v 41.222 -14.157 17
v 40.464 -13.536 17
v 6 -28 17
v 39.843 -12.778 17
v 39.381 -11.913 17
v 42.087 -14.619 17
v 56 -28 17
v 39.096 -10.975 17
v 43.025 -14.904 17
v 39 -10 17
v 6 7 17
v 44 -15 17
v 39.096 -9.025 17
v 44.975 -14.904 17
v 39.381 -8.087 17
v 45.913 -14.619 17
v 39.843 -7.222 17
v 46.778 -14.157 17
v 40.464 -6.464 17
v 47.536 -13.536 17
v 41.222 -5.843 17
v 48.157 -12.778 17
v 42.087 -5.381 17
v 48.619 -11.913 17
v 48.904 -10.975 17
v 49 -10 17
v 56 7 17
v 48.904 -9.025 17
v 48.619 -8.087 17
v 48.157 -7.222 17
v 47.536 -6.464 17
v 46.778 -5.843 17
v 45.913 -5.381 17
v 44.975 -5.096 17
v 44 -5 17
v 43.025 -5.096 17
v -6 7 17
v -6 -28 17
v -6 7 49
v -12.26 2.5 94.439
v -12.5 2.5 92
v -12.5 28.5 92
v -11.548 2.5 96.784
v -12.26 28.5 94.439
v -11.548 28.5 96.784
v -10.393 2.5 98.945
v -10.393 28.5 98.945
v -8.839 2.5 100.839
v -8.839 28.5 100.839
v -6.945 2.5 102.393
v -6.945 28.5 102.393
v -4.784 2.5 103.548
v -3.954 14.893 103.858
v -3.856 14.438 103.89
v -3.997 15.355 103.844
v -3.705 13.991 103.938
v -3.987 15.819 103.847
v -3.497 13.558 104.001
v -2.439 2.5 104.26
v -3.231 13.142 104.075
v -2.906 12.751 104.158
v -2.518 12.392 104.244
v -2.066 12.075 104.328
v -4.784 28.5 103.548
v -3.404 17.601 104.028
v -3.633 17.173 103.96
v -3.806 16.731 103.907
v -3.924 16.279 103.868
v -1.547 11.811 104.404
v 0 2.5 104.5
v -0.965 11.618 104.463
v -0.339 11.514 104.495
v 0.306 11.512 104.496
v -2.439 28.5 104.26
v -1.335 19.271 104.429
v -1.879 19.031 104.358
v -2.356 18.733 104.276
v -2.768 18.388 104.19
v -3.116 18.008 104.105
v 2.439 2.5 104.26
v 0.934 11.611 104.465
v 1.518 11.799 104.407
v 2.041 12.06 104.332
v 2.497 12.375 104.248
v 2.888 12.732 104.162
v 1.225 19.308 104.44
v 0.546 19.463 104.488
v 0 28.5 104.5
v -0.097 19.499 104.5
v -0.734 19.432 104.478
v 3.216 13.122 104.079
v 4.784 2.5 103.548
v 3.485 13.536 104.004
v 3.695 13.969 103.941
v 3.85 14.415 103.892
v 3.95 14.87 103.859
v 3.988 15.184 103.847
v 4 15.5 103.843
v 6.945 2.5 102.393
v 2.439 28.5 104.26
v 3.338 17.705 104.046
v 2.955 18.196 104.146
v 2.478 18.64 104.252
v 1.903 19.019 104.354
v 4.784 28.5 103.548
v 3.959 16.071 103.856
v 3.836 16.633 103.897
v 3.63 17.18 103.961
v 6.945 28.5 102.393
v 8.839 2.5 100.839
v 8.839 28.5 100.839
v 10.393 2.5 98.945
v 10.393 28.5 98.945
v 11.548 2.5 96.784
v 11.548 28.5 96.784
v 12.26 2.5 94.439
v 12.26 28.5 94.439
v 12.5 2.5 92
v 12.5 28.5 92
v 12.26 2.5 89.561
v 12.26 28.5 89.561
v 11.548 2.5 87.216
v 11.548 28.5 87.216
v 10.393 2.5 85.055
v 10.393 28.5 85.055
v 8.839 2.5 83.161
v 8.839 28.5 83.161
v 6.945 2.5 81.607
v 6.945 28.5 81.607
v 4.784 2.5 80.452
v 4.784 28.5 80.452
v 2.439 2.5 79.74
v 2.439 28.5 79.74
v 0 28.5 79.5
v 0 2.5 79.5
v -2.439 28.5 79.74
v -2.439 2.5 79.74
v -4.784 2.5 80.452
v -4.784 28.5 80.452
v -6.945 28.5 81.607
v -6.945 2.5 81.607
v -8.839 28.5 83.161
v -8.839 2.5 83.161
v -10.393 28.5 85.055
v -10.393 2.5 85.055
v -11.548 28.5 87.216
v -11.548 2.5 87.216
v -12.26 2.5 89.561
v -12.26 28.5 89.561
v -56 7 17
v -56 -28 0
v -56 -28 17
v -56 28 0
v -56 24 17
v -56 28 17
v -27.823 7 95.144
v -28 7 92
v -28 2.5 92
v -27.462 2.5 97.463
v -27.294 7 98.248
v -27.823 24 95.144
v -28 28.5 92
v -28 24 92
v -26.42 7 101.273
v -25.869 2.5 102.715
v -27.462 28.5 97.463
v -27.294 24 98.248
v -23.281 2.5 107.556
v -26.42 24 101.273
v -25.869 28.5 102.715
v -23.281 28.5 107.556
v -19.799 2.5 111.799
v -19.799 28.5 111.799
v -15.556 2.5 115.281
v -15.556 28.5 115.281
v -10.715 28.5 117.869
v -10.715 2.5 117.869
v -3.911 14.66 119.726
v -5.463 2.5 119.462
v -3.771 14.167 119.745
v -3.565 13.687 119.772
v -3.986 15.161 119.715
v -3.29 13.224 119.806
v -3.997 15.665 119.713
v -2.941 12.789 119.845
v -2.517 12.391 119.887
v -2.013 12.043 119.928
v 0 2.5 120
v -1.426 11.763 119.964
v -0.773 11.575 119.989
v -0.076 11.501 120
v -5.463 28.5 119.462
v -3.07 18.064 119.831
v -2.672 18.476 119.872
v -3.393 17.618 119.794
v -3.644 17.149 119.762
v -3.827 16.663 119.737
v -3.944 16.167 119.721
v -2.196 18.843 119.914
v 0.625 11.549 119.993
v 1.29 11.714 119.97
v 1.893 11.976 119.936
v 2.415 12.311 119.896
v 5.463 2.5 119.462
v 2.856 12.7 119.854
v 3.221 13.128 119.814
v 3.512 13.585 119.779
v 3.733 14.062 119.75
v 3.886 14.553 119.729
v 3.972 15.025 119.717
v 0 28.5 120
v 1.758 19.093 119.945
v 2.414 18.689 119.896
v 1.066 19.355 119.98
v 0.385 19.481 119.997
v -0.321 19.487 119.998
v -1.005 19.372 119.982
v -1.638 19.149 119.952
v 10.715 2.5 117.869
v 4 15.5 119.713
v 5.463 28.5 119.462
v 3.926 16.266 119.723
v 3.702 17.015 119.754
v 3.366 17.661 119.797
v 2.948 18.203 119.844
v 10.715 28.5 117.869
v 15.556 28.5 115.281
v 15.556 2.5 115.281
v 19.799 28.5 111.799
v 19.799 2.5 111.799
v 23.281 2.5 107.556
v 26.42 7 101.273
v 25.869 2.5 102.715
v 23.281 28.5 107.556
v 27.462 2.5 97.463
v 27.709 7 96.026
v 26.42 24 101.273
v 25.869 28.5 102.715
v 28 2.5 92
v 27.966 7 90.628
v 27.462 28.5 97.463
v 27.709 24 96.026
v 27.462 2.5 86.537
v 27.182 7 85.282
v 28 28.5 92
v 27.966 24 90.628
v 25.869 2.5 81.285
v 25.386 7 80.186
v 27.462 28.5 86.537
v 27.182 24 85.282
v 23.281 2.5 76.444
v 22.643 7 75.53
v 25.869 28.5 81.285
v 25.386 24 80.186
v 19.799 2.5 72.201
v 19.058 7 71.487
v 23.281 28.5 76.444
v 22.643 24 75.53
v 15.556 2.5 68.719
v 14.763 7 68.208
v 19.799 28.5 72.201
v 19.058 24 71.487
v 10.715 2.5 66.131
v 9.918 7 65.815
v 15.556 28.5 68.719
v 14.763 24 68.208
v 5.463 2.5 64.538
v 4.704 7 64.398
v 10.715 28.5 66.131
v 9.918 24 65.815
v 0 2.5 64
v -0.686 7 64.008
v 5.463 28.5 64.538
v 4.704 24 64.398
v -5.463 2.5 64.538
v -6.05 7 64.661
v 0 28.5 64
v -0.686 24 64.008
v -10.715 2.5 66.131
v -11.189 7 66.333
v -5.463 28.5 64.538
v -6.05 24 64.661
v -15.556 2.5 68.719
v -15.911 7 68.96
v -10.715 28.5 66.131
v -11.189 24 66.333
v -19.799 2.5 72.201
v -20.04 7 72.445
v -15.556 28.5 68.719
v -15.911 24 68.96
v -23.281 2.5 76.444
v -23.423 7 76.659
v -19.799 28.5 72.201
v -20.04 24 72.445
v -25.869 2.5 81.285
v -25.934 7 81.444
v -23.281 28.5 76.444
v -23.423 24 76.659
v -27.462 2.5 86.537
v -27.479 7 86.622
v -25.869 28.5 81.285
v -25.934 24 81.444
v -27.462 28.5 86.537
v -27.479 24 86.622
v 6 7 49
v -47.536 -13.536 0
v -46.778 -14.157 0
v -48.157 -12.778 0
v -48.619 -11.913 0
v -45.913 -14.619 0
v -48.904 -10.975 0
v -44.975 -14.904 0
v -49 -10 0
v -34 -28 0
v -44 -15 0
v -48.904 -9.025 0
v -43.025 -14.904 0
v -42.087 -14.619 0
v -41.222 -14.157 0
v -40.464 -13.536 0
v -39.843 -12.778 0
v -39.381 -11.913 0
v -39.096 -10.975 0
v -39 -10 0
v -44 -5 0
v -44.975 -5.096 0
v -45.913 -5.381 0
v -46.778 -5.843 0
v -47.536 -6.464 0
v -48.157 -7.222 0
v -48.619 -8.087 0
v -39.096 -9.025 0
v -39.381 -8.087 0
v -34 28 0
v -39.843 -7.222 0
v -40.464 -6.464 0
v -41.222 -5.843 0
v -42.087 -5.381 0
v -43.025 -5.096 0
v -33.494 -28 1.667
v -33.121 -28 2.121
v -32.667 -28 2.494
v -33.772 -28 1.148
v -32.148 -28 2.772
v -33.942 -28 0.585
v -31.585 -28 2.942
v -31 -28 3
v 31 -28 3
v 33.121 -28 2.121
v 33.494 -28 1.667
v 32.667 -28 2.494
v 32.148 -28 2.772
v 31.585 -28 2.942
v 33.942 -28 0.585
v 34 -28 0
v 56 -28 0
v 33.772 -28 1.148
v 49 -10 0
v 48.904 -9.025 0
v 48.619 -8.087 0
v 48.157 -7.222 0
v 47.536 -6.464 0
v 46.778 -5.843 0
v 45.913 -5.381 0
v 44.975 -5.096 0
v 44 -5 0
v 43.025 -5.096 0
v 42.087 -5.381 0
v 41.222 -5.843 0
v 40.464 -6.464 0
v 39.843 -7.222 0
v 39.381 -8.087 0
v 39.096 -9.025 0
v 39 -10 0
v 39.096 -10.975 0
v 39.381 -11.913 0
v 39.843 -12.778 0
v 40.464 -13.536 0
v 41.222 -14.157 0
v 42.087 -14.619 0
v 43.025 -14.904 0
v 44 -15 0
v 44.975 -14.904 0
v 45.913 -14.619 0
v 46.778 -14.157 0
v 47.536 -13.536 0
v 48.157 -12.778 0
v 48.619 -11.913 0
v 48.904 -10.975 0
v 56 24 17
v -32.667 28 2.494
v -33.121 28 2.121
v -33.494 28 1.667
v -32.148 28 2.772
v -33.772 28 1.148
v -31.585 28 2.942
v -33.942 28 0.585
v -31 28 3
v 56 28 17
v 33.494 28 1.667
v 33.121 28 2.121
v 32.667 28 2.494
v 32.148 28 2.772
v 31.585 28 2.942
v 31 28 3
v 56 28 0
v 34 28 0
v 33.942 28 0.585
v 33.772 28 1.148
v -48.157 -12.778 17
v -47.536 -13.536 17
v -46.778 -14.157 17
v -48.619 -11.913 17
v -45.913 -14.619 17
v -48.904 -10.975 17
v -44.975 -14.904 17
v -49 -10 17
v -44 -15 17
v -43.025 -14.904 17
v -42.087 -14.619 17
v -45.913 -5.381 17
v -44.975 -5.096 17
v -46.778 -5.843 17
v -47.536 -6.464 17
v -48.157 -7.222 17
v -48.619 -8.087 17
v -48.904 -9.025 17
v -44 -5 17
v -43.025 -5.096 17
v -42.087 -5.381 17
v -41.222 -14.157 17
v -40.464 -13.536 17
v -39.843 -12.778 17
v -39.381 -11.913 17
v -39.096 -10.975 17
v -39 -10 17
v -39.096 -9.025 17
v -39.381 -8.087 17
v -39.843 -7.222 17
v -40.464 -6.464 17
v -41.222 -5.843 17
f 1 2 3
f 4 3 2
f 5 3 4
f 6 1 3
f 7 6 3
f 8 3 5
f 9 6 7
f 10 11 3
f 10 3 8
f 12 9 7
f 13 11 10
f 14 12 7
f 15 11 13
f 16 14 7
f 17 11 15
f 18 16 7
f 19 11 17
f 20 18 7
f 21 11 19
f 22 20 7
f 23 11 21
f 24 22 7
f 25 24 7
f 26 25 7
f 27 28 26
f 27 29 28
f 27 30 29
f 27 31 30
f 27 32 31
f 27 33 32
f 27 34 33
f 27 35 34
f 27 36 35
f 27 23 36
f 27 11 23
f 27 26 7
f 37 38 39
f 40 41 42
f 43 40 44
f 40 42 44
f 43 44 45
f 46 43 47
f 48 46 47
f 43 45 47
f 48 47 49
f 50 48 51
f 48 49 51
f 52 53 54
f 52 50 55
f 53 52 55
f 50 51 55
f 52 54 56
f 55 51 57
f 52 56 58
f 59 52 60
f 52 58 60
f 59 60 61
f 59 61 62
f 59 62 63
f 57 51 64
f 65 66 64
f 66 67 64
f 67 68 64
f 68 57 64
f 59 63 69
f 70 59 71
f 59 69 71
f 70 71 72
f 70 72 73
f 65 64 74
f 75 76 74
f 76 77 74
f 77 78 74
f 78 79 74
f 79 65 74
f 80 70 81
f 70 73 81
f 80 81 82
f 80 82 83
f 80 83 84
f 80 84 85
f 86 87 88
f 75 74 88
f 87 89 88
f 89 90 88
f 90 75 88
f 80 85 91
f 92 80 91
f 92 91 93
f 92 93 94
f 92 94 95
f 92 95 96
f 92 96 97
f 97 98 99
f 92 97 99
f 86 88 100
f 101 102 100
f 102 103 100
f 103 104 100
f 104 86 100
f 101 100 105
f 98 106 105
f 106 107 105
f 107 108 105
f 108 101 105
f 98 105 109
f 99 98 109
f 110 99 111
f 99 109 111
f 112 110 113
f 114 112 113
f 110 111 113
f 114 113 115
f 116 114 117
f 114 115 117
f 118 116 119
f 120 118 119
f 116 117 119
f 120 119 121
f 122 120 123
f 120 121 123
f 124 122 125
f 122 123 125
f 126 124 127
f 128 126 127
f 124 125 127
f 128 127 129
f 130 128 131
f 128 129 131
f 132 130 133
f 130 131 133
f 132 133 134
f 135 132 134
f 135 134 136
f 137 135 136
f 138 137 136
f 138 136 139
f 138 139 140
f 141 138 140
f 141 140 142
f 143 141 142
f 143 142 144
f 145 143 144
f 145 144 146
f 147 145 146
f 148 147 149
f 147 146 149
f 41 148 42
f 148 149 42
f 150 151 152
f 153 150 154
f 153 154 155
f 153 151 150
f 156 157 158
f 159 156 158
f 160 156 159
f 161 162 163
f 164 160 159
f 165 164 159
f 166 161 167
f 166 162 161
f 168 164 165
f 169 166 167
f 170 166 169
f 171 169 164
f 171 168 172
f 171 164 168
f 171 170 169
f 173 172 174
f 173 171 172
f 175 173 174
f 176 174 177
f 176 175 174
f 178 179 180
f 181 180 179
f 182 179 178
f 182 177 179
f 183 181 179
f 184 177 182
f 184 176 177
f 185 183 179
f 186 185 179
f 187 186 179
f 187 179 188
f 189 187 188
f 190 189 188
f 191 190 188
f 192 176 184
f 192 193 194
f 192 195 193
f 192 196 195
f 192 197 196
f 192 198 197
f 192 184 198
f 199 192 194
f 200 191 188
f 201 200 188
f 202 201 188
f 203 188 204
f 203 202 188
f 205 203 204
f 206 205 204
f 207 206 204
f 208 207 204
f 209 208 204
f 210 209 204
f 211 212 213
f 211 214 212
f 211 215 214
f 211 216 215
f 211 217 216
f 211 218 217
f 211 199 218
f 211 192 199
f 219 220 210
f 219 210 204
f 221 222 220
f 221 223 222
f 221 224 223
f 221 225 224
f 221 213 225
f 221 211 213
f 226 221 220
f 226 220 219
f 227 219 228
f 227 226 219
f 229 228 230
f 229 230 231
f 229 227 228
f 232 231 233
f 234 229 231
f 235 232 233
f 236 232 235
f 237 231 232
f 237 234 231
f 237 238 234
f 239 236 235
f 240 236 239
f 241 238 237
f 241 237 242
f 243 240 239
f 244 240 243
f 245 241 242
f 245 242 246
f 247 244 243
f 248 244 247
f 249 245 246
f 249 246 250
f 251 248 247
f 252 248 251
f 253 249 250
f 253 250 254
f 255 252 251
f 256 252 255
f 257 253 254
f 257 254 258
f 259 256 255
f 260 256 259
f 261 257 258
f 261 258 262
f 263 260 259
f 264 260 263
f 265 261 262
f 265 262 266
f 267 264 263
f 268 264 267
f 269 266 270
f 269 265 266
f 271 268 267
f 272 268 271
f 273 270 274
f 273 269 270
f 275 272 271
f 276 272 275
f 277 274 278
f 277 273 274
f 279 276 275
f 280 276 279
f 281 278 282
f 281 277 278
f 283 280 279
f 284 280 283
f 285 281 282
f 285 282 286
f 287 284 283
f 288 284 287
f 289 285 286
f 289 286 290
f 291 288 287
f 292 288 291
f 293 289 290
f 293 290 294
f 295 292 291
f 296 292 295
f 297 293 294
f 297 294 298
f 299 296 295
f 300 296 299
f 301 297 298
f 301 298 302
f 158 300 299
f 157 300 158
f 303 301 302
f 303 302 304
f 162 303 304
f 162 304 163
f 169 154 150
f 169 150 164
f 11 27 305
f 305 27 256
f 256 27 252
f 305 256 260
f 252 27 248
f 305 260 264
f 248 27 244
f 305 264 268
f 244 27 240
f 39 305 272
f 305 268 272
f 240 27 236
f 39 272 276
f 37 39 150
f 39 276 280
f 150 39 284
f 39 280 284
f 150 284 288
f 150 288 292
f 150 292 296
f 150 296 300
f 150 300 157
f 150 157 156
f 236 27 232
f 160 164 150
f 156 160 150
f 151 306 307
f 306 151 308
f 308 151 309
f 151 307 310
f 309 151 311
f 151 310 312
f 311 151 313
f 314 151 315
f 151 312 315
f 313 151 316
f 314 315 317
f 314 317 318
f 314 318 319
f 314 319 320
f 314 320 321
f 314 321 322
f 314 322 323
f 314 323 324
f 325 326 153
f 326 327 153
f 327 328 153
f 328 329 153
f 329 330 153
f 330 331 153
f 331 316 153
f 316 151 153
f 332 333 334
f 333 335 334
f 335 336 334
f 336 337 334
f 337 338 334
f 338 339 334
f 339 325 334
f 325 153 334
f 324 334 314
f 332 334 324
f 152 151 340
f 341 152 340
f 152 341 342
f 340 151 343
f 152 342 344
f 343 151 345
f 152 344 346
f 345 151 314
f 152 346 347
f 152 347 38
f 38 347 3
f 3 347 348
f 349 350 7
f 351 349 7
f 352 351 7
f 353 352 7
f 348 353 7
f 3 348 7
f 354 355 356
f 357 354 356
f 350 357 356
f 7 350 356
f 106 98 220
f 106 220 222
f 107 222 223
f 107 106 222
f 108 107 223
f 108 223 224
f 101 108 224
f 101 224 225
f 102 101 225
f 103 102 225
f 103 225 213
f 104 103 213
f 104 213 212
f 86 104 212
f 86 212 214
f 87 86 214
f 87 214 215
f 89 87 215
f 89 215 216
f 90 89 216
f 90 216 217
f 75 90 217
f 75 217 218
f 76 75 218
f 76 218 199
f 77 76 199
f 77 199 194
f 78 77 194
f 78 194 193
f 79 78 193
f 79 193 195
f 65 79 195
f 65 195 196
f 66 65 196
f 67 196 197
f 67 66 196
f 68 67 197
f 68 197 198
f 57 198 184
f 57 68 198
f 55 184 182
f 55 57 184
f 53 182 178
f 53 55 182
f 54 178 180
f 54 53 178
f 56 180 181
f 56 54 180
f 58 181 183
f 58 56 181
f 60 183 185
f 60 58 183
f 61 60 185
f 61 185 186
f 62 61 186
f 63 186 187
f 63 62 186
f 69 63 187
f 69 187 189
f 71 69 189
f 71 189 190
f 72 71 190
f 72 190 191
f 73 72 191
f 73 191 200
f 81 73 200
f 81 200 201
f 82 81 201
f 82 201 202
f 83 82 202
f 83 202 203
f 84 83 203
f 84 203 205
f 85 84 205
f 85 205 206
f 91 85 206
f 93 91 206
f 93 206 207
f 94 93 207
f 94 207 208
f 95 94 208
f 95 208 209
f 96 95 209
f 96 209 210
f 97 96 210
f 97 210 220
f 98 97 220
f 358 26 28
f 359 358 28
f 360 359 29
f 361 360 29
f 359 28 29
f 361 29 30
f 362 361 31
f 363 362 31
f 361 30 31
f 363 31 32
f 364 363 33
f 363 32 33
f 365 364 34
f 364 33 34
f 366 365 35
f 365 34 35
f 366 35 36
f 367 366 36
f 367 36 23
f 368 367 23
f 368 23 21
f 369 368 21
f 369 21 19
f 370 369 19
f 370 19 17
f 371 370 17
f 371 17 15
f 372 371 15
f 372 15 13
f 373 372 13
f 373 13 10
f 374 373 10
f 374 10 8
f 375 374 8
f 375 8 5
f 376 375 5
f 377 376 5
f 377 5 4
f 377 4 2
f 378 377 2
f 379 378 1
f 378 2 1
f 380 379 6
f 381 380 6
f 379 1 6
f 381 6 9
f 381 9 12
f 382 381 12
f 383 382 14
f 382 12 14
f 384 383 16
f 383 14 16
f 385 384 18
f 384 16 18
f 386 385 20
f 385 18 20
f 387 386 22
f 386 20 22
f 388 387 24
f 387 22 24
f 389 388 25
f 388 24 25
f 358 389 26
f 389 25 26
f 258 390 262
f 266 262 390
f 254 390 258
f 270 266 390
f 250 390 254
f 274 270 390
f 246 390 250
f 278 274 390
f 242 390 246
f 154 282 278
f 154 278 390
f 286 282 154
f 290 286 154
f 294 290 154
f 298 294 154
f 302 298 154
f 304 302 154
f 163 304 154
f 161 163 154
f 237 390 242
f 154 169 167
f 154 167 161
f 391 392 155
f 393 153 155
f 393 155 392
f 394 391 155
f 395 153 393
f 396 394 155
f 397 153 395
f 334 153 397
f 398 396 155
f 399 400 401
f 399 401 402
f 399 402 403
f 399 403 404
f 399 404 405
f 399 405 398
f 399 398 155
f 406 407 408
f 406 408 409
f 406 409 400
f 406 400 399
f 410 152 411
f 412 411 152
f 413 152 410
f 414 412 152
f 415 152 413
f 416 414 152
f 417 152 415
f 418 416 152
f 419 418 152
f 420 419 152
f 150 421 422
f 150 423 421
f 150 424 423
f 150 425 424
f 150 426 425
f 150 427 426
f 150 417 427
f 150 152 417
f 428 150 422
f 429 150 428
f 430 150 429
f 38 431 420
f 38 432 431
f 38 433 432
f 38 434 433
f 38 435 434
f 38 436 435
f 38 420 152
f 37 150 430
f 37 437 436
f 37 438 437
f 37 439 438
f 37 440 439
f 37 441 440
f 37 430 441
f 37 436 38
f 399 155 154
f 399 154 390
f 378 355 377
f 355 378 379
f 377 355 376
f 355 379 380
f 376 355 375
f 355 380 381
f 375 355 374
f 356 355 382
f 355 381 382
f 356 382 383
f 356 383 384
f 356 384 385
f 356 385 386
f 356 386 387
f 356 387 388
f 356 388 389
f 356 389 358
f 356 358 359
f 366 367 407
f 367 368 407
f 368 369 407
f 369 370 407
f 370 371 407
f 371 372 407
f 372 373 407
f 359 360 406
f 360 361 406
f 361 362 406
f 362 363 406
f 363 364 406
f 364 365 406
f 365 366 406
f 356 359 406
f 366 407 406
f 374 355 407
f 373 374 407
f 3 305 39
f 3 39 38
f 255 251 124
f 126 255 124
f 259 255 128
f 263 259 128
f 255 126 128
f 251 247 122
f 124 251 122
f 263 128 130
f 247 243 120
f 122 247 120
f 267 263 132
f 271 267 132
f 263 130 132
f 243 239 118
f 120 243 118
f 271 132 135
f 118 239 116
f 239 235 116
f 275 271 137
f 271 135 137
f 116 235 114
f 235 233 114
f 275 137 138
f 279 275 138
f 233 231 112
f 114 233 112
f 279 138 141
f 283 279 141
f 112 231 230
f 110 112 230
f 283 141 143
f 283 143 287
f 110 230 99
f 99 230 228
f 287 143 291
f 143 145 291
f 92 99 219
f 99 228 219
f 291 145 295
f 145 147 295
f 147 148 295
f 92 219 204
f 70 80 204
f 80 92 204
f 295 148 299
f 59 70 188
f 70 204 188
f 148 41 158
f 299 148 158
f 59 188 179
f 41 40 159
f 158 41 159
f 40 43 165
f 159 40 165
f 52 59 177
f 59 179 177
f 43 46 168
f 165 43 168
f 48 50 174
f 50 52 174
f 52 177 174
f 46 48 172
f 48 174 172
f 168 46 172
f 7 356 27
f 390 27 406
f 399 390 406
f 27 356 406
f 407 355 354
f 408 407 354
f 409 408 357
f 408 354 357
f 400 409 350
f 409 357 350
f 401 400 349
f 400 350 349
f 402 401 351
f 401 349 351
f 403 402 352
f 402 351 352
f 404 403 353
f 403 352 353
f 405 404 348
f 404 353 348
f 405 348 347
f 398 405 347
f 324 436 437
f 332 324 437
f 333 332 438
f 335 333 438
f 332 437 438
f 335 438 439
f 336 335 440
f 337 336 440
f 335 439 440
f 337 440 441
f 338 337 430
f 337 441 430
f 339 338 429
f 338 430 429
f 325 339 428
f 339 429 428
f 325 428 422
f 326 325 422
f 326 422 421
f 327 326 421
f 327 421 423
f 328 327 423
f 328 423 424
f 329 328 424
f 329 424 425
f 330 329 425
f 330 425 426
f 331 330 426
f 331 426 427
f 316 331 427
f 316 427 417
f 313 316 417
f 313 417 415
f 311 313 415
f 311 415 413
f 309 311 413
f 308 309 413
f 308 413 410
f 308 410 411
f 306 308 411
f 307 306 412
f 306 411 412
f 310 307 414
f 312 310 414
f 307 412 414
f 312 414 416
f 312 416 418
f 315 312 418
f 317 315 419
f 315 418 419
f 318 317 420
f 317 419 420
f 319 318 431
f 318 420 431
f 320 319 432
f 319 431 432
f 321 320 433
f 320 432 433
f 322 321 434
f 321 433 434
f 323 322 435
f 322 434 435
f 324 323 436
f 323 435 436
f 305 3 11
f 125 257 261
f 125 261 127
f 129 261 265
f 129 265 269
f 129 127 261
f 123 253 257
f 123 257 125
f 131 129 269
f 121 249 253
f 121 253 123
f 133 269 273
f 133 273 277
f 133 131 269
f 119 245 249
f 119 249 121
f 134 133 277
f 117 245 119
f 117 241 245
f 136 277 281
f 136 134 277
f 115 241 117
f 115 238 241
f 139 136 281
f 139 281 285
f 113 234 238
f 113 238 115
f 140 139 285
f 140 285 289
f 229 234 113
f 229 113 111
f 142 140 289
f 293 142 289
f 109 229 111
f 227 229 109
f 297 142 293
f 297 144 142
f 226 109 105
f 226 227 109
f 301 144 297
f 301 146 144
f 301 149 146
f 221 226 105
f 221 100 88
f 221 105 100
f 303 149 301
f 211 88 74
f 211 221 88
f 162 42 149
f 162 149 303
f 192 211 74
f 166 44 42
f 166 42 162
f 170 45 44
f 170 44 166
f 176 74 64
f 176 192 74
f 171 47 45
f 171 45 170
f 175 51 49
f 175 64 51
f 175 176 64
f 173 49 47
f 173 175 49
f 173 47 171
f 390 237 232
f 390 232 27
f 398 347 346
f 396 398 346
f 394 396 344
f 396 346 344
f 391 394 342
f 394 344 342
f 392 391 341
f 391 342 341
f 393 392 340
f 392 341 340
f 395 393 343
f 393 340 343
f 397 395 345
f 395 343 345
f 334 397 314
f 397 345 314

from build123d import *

# Parameters (mm, degrees)
F0_W      = 112
F0_H      = 56
F1_DEPTH  = 17
F3_R      = 12.5
F4_DEPTH  = 17
F6_R      = 28
F7_DEPTH  = 13
F8_DEPTH  = 25
F10_R     = 4
F11_DEPTH = 28.001
F12_R     = 5
F13_DEPTH = 17.001
F16_DEPTH = 6
F18_DEPTH = 56.5010001


with BuildPart() as f1:
    # F0 (on Top) → F1 (new body)
    with BuildSketch(Plane.XY):
        Rectangle(F0_W, F0_H)
    extrude(amount=F1_DEPTH)

    # F3 (on offset) → F4 (join)
    with BuildSketch(Plane(origin=(0, 24, 0), x_dir=(-1, 0, 0), z_dir=(0, 1, 0))):
        with BuildLine():
            Line((-26.4197592234, 101.2734202201), (-56, 17))
            Line((-56, 17), (56, 17))
            Line((56, 17), (26.4197592234, 101.2734202201))
            ThreePointArc((26.4197592234, 101.2734202201), (27.6021127656, 96.7035487531), (28, 92))
            ThreePointArc((28, 92), (-4.7035487531, 64.3978872344), (-26.4197592234, 101.2734202201))
        make_face()
        with BuildLine():
            ThreePointArc((26.4197592234, 101.2734202201), (0, 120), (-26.4197592234, 101.2734202201))
            ThreePointArc((-26.4197592234, 101.2734202201), (-4.7035487531, 64.3978872344), (28, 92))
            ThreePointArc((28, 92), (27.6021127656, 96.7035487531), (26.4197592234, 101.2734202201))
        make_face()
        with Locations((0, 92)):
            Circle(F3_R, mode=Mode.SUBTRACT)
    extrude(amount=-F4_DEPTH)

    # F6 (on offset) → F7 (join, symmetric)
    with BuildSketch(Plane(origin=(0, 15.5, 0), x_dir=(-1, 0, 0), z_dir=(0, 1, 0))):
        with Locations((0, 92)):
            Circle(F6_R)
    extrude(amount=F7_DEPTH, both=True)

    # F3 (on offset) → F8 (cut, symmetric)
    with BuildSketch(Plane(origin=(0, 24, 0), x_dir=(-1, 0, 0), z_dir=(0, 1, 0))):
        with Locations((0, 92)):
            Circle(F3_R)
    extrude(amount=F8_DEPTH, both=True, mode=Mode.SUBTRACT)

    # F10 (on offset) → F11 (cut, through all)
    with BuildSketch(Plane.XY.offset(92)):
        with Locations((0, 15.5)):
            Circle(F10_R)
    extrude(amount=F11_DEPTH, mode=Mode.SUBTRACT)

    # F12 (on face) → F13 (cut, through all)
    with BuildSketch(Plane.XY.offset(17)):
        with Locations((-44, -10)):
            Circle(F12_R)
        with Locations((44, -10)):
            Circle(F12_R)
    extrude(amount=-F13_DEPTH, mode=Mode.SUBTRACT)

    # F15 (on offset) → F16 (join, symmetric)
    with BuildSketch(Plane.YZ):
        Polygon((7, 17), (7, 49), (-28, 17), align=None)
    extrude(amount=F16_DEPTH, both=True)

    # F17 (on face) → F18 (cut, through all)
    with BuildSketch(Plane.XZ.offset(28)):
        with BuildLine():
            Line((31, 3), (-31, 3))
            ThreePointArc((-31, 3), (-34, 0), (-31, -3))
            Line((-31, -3), (31, -3))
            ThreePointArc((31, -3), (34, 0), (31, 3))
        make_face()
    extrude(amount=-F18_DEPTH, mode=Mode.SUBTRACT)


solid = f1.part
